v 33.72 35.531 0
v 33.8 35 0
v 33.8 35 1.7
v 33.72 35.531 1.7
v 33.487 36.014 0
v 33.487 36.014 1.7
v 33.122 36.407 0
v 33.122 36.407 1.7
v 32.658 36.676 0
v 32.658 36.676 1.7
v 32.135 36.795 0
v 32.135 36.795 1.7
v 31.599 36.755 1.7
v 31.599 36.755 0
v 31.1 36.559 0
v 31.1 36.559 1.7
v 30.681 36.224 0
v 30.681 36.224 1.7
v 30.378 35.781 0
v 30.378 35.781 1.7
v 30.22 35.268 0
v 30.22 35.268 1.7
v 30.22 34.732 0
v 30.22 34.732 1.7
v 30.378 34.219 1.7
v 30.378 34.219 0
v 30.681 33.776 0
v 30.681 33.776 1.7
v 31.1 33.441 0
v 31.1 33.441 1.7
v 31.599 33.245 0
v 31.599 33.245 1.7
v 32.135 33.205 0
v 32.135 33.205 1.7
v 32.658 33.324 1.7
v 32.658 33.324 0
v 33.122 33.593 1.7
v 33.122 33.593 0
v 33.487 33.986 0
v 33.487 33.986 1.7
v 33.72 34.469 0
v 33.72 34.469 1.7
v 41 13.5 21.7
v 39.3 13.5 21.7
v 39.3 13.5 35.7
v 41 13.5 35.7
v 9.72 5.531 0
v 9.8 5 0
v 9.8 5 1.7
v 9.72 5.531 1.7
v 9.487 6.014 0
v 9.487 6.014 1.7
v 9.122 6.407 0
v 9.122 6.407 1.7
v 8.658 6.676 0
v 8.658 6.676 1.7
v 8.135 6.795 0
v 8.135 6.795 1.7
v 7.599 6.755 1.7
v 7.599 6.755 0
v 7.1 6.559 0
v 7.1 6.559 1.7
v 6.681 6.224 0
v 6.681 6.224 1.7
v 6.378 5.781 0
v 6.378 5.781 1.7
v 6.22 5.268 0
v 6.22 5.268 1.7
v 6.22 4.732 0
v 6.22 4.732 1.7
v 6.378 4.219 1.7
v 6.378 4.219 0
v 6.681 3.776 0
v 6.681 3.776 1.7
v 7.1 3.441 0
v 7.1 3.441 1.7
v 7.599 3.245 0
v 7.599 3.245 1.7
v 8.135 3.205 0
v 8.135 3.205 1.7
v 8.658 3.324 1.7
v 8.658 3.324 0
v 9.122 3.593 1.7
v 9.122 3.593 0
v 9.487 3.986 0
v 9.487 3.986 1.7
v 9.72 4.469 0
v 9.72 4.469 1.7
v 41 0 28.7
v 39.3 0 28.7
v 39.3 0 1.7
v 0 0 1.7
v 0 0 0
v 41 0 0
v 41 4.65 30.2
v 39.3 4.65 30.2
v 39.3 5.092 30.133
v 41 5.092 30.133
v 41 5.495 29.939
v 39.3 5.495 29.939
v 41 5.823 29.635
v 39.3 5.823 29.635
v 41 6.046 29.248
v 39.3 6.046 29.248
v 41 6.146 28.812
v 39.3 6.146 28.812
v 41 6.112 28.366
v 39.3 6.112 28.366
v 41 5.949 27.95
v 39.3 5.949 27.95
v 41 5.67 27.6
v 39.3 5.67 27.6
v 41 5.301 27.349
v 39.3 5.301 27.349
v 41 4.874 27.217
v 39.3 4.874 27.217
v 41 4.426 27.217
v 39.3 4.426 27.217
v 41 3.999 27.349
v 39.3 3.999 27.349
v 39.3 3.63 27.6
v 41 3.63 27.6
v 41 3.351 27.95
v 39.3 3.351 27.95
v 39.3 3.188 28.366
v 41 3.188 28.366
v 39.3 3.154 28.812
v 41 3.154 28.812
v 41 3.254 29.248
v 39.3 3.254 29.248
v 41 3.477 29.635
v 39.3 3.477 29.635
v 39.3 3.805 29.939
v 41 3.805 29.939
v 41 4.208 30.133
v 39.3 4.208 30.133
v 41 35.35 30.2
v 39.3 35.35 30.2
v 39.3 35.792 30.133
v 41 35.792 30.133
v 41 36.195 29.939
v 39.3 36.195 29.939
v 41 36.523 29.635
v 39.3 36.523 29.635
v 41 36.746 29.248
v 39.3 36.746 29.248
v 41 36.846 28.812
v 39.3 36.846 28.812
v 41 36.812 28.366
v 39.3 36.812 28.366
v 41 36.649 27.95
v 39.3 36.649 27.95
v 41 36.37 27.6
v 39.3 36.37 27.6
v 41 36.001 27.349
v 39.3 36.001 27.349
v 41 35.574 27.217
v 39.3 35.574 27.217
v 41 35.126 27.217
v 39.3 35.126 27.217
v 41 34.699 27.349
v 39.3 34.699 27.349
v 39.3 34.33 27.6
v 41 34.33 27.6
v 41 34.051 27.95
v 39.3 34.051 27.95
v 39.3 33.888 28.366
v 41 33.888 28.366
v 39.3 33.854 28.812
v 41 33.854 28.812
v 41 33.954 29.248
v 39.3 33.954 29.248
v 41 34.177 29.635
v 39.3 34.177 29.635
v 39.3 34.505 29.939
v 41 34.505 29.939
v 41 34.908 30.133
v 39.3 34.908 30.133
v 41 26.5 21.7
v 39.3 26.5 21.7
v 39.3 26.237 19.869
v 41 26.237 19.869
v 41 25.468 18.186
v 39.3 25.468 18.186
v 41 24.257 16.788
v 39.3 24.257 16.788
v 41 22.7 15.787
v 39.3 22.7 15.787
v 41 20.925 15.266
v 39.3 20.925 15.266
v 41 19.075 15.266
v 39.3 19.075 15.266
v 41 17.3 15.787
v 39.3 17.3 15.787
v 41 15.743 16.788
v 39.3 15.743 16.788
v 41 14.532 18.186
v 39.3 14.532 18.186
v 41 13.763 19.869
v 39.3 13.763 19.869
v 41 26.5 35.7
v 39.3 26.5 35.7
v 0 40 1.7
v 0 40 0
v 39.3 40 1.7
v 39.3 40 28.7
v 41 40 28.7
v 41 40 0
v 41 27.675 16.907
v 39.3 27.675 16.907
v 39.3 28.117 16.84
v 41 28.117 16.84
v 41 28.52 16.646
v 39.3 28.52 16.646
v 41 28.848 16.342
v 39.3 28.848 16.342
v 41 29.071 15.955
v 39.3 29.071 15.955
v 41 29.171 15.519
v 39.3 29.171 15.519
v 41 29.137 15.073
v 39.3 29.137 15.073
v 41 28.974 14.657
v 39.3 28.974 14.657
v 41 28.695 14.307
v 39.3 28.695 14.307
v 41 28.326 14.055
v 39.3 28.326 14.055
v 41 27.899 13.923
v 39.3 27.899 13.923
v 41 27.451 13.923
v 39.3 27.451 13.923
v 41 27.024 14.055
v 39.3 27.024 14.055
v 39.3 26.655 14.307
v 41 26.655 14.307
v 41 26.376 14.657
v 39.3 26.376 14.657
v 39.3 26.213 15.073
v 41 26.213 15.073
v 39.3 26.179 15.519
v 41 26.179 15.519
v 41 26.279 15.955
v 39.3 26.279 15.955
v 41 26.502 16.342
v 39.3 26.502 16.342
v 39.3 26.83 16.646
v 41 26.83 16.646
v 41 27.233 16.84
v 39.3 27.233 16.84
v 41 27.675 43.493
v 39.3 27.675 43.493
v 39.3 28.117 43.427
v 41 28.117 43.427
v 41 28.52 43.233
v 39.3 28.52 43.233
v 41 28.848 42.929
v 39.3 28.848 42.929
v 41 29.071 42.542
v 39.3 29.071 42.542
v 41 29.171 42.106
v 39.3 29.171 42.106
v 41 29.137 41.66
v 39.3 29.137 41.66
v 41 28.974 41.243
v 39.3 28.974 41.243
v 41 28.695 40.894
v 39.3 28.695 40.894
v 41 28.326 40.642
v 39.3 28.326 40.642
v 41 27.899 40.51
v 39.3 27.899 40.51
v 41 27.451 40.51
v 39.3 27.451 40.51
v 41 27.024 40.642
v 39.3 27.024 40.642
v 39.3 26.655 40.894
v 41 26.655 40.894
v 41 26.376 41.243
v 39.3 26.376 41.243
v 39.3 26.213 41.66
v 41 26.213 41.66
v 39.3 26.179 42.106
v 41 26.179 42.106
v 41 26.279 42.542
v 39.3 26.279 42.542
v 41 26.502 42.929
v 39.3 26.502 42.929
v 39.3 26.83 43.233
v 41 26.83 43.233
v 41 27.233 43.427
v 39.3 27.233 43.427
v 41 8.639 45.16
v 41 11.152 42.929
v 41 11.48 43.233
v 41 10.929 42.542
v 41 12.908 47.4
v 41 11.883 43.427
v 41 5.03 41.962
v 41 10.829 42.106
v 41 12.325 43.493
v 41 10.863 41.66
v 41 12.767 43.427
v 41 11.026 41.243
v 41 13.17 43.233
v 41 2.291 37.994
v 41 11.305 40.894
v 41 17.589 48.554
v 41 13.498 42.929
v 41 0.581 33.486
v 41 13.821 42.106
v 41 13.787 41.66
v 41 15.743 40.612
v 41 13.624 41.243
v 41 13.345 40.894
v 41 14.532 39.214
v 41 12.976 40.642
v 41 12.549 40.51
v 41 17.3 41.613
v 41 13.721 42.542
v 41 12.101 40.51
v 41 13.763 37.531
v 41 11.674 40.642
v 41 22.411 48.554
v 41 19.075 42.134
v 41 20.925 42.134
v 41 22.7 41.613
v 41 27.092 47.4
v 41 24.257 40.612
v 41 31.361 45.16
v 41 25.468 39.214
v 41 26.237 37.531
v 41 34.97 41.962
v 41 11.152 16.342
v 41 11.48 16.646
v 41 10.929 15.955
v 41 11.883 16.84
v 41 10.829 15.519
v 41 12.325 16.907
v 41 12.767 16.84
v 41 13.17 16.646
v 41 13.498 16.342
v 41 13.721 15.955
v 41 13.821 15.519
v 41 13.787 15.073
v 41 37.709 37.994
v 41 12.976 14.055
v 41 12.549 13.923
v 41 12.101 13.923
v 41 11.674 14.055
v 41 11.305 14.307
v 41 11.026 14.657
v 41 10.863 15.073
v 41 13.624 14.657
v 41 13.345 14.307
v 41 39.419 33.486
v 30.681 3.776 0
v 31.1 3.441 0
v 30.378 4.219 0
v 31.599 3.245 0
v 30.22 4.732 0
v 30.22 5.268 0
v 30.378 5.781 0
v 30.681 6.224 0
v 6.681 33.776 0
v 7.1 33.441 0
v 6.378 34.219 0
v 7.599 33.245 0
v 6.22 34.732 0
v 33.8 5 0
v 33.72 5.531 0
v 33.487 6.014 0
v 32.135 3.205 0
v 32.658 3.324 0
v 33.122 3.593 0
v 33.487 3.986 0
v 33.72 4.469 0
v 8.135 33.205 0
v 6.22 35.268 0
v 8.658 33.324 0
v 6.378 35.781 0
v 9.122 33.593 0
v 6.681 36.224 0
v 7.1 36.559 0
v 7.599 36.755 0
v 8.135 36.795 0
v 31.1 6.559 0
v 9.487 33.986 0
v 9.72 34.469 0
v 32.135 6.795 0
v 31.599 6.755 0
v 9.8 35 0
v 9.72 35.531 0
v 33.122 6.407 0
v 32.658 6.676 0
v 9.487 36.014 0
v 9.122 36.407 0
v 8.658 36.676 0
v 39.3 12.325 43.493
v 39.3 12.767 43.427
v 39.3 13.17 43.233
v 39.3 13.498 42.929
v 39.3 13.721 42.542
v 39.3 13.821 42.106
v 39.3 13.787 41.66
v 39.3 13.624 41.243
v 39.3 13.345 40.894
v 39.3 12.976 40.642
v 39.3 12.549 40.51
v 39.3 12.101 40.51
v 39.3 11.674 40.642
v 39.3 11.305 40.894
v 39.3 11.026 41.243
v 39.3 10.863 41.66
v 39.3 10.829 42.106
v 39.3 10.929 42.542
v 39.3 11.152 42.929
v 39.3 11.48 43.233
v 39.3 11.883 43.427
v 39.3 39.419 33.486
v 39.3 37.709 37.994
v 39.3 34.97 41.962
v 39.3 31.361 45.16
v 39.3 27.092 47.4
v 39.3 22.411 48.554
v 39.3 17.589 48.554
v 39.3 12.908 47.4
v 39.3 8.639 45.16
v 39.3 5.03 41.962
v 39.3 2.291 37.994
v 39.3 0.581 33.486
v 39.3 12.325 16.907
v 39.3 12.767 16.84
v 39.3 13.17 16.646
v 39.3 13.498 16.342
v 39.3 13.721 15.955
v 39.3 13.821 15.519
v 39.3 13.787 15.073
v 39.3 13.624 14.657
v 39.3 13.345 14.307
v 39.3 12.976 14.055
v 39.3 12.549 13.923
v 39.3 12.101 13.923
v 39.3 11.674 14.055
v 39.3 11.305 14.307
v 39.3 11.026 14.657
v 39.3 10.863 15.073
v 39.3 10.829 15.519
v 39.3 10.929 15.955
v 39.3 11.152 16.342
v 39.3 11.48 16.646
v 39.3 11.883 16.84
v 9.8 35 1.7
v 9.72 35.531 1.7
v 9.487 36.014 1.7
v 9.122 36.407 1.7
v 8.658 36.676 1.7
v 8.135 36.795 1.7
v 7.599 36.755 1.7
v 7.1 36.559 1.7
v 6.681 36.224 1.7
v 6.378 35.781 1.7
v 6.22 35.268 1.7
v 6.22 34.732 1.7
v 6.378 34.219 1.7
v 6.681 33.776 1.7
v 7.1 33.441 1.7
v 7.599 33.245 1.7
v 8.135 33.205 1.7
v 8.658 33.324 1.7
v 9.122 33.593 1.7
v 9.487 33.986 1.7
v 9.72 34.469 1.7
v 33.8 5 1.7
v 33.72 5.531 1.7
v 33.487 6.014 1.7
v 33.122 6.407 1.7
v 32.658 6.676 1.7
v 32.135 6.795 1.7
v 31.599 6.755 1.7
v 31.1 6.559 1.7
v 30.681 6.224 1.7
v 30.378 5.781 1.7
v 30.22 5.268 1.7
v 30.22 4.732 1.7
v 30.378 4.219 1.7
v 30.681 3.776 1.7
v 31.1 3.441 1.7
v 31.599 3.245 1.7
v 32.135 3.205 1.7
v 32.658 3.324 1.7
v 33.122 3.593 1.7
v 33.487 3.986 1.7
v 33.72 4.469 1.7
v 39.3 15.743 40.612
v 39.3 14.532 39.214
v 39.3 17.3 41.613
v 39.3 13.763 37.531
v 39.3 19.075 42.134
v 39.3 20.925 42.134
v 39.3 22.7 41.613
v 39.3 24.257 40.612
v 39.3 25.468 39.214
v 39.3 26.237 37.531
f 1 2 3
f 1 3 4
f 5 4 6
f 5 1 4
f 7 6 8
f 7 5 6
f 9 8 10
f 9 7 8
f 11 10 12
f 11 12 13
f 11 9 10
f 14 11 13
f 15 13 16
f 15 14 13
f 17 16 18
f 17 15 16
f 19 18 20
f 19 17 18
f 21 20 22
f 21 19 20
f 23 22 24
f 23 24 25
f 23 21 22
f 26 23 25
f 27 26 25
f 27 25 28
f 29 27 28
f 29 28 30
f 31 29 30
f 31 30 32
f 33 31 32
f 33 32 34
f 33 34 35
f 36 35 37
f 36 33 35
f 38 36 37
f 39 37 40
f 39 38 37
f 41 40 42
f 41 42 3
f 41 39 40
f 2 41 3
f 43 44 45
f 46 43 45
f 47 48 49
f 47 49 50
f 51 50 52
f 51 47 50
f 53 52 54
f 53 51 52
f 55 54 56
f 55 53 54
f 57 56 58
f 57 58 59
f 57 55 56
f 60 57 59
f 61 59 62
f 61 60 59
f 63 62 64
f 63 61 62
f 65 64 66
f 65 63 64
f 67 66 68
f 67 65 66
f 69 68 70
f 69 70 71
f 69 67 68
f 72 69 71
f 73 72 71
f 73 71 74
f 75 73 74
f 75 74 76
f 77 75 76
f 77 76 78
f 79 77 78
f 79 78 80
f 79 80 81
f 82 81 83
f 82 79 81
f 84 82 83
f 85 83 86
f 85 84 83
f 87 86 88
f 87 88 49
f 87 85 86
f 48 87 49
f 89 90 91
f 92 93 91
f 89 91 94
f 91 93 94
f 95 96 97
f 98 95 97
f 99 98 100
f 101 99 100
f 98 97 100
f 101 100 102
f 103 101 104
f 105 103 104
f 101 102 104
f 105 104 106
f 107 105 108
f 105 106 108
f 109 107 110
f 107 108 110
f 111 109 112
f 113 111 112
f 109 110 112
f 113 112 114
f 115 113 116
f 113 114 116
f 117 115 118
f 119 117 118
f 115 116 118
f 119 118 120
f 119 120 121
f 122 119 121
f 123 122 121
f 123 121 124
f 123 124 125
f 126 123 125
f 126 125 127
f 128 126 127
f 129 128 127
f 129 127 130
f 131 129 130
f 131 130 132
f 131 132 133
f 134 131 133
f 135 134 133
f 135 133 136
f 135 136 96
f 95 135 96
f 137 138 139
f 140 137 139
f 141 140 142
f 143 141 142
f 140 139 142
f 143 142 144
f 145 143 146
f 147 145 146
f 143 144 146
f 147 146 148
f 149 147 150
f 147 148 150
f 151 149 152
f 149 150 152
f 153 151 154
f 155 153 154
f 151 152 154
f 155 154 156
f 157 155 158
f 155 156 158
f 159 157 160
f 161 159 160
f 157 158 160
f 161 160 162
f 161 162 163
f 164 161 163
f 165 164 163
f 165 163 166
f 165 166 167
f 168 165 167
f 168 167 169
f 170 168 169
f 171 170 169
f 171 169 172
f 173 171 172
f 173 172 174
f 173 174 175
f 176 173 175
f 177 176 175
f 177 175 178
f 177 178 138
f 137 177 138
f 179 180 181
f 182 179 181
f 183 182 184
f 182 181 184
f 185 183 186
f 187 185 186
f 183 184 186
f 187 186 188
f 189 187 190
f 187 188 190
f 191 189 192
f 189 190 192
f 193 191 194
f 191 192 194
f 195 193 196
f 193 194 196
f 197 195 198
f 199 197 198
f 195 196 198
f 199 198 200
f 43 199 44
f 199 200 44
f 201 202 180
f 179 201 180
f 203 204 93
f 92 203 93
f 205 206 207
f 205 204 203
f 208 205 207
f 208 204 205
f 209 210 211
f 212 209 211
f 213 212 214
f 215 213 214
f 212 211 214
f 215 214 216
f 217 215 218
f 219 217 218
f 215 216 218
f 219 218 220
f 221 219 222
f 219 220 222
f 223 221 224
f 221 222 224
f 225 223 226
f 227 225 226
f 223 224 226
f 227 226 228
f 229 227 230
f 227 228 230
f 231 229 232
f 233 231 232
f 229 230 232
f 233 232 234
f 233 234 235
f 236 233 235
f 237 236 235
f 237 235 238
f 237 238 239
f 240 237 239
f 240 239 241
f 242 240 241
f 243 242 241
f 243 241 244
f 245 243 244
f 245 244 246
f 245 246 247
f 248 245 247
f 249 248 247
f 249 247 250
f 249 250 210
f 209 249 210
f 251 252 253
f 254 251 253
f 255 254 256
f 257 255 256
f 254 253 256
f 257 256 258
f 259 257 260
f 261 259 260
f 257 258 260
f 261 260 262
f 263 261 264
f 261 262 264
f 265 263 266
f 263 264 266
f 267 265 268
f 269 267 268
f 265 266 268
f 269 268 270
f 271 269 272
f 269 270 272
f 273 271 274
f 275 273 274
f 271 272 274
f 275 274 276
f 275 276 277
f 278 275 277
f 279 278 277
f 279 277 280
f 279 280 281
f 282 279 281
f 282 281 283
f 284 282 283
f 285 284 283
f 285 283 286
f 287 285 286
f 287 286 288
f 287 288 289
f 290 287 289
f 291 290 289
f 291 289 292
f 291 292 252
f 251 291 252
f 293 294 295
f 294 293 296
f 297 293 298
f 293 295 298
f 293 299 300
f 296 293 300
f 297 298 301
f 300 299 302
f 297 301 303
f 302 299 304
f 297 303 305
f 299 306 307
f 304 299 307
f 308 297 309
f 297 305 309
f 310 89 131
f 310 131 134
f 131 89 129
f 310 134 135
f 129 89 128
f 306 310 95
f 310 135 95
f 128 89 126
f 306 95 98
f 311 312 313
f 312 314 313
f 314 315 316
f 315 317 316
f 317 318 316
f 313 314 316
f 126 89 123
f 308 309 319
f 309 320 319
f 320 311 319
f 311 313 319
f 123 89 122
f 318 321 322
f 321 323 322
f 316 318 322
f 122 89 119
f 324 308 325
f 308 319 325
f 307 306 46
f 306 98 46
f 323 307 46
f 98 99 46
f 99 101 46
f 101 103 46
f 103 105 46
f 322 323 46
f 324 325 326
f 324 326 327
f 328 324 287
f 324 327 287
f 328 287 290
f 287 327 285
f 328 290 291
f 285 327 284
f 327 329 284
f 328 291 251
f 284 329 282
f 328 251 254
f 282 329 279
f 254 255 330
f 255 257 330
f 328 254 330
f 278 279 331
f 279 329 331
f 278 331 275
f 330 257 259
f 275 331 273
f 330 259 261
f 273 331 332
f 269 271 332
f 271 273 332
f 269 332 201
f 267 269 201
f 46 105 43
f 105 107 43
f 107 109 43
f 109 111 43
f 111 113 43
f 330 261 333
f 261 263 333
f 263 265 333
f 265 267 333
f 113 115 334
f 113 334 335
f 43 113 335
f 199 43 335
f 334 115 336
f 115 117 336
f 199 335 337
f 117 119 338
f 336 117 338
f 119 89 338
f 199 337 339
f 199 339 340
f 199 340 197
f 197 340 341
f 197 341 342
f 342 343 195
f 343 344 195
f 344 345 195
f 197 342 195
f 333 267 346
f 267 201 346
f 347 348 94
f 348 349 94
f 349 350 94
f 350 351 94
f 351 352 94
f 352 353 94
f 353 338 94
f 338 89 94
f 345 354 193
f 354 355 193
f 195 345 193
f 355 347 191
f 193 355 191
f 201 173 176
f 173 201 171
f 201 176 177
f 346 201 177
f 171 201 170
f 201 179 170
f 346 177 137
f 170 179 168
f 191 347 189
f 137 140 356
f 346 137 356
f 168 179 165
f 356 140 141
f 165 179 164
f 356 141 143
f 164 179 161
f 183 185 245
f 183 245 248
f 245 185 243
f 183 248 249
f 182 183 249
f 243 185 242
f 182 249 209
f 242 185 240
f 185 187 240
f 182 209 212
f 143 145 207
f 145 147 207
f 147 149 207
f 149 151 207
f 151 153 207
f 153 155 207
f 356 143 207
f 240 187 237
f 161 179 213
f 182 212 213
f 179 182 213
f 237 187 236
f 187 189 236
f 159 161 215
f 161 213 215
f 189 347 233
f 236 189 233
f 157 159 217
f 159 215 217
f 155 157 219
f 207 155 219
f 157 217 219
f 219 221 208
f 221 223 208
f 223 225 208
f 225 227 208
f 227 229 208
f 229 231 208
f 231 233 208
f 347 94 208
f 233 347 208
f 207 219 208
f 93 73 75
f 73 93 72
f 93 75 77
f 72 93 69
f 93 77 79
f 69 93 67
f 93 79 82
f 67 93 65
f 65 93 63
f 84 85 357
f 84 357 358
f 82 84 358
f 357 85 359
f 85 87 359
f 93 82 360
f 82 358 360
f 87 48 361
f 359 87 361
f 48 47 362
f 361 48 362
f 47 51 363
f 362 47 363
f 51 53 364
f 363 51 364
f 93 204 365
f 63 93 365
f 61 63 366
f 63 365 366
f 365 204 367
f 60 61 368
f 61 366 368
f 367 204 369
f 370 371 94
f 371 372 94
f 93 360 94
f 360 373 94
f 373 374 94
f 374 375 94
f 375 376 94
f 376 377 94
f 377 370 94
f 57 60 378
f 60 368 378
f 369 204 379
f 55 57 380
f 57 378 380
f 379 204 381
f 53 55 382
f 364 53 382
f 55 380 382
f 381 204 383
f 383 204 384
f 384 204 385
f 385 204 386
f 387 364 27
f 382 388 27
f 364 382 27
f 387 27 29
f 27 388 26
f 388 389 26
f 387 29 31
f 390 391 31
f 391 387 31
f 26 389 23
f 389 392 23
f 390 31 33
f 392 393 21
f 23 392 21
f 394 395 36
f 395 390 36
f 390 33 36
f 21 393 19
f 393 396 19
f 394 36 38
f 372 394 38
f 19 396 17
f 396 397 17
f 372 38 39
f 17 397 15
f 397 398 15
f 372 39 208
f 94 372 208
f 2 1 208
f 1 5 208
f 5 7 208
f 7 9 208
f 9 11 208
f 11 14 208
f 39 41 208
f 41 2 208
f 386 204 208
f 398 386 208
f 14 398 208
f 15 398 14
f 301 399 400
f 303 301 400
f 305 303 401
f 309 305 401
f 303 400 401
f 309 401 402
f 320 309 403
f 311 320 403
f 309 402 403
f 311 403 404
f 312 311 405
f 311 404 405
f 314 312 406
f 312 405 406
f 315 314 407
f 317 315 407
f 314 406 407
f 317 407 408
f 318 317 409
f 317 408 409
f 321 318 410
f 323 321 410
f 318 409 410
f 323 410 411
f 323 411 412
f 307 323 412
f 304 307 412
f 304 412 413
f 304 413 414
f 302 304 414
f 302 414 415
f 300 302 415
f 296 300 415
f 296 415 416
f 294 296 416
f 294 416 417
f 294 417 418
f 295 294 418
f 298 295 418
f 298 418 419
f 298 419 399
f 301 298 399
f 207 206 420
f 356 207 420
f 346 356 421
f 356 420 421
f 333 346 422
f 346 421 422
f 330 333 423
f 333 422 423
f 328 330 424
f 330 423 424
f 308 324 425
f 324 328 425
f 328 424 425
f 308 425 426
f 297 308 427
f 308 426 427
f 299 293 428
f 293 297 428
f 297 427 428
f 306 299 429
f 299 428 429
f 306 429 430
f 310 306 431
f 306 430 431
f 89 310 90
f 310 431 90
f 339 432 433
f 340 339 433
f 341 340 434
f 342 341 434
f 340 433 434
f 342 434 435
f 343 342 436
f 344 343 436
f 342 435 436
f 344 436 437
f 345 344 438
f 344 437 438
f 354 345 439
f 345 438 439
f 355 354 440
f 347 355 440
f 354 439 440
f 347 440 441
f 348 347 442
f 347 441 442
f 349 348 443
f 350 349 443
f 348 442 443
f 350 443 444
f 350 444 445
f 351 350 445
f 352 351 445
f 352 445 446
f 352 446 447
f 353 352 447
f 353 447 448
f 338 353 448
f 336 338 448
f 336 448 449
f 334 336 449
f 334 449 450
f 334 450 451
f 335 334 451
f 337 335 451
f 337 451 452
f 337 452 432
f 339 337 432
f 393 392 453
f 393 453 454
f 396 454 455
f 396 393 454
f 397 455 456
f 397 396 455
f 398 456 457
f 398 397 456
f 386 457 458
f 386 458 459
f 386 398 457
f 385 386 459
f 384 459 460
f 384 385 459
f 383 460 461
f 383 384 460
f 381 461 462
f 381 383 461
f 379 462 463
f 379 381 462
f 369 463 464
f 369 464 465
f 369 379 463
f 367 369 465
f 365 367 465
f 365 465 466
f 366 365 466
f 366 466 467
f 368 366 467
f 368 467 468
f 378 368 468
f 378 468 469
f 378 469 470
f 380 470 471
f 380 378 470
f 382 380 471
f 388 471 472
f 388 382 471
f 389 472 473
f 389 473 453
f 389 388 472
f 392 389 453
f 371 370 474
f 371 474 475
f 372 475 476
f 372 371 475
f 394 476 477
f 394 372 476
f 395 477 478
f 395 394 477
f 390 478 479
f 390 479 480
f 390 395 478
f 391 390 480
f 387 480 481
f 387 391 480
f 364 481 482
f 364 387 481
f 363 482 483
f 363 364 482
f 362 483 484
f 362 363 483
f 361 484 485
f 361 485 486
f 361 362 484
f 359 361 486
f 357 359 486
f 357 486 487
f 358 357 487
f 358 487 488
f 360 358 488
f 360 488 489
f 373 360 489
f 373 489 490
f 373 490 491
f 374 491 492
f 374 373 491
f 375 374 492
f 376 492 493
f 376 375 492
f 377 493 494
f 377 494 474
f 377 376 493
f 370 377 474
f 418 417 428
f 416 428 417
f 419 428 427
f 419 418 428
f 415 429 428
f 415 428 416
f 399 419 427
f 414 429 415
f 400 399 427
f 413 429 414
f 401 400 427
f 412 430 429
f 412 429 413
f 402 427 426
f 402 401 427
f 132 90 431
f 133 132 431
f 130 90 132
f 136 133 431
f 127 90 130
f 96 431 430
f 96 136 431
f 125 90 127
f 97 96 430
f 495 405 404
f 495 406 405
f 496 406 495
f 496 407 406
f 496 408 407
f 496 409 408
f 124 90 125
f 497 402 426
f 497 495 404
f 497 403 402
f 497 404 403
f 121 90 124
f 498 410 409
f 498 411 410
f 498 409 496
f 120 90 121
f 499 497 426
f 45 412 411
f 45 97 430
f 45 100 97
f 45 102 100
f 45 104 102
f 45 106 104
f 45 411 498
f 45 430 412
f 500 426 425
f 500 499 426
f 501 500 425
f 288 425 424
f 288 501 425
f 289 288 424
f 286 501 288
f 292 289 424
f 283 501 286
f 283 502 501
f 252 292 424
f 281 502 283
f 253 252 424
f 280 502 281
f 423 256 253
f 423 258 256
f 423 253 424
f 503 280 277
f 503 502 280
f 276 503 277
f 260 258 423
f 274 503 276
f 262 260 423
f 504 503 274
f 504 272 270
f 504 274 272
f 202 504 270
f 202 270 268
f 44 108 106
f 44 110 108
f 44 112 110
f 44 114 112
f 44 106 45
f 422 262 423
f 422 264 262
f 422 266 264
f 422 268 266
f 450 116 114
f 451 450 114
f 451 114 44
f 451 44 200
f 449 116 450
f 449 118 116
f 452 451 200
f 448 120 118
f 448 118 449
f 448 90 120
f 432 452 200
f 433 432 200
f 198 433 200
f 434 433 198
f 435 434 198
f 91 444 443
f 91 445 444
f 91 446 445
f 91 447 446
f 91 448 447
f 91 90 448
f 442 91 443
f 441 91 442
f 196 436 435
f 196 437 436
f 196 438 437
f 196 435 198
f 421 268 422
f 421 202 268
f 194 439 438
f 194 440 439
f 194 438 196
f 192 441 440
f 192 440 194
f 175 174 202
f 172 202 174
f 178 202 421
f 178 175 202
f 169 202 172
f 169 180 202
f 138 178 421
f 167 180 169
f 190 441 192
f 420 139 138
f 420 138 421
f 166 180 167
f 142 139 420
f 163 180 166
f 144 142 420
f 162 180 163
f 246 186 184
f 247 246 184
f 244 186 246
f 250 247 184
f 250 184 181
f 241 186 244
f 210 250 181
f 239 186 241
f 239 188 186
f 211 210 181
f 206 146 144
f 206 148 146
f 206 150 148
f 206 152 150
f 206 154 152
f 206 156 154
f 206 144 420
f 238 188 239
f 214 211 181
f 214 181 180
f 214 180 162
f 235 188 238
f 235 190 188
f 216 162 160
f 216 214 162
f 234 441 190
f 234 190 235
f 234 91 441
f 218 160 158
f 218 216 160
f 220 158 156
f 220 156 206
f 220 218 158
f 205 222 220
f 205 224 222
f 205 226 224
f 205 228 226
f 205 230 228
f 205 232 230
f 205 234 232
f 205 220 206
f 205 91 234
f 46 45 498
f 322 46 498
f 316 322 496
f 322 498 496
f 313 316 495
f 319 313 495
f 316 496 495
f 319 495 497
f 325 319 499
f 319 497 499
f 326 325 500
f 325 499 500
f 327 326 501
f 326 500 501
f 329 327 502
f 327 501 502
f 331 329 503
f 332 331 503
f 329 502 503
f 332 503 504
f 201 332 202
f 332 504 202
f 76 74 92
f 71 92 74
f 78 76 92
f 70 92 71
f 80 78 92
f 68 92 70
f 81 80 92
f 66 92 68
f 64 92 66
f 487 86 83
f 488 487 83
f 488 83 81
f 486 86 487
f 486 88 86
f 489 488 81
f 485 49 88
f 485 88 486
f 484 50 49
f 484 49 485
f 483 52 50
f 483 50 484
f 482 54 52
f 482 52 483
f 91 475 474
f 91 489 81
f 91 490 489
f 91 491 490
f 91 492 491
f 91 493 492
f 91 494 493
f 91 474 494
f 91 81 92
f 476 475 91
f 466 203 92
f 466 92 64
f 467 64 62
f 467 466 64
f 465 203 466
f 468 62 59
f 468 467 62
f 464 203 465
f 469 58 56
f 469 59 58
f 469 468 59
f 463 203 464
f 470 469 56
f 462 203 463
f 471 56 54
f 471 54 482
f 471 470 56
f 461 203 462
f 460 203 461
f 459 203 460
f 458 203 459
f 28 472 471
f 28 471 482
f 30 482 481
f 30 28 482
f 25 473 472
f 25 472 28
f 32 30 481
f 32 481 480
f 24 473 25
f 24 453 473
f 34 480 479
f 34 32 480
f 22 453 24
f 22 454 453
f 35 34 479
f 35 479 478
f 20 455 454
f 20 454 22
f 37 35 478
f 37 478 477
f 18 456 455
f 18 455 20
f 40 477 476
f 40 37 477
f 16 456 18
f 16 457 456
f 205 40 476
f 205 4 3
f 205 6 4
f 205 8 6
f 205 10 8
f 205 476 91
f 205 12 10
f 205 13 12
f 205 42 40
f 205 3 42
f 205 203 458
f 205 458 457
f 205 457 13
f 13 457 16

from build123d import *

# Parameters (mm, degrees)
CROQUIS1_R              = 1.8
SALIENTE_EXTRUIR1_DEPTH = 1.7
CROQUIS2_W              = 1.7
CROQUIS2_H              = 40
SALIENTE_EXTRUIR2_DEPTH = 60
CORTAR_EXTRUIR1_DEPTH   = 10
CROQUIS3_4_R            = 1.5
CORTAR_EXTRUIR2_DEPTH   = 10


with BuildPart() as part:
    # Croquis1 → Saliente-Extruir1 (new body)
    with BuildSketch(Plane.XY):
        Polygon((0, 0), (8, 0), (41, 0), (41, 40), (8, 40), (0, 40), align=None)
        with Locations((8, 5)):
            Circle(CROQUIS1_R, mode=Mode.SUBTRACT)
        with Locations((8, 35)):
            Circle(CROQUIS1_R, mode=Mode.SUBTRACT)
        with Locations((32, 5)):
            Circle(CROQUIS1_R, mode=Mode.SUBTRACT)
        with Locations((32, 35)):
            Circle(CROQUIS1_R, mode=Mode.SUBTRACT)
    extrude(amount=SALIENTE_EXTRUIR1_DEPTH)

    # Croquis2 → Saliente-Extruir2 (add)
    with BuildSketch(Plane.XY.offset(1.7)):
        with Locations((40.15, 20)):
            Rectangle(CROQUIS2_W, CROQUIS2_H)
    extrude(amount=SALIENTE_EXTRUIR2_DEPTH)

    # Croquis3 → Cortar-Extruir1 (cut)
    with BuildSketch(Plane.ZY.offset(-39.3)):
        with BuildLine():
            Line((61.7, 40), (28.7, 40))
            ThreePointArc((28.7, 40), (48.7, 20), (28.7, 0))
            Line((28.7, 0), (61.7, 0))
            Line((61.7, 0), (61.7, 40))
        make_face()
        with BuildLine():
            Line((21.7, 13.5), (35.7, 13.5))
            ThreePointArc((35.7, 13.5), (42.2, 20), (35.7, 26.5))
            Line((35.7, 26.5), (21.7, 26.5))
            ThreePointArc((21.7, 26.5), (15.2, 20), (21.7, 13.5))
        make_face()
    extrude(amount=-CORTAR_EXTRUIR1_DEPTH, mode=Mode.SUBTRACT)

    # Croquis3<4> → Cortar-Extruir2 (cut)
    with BuildSketch(Plane.ZY.offset(-39.3)):
        with Locations((15.406510052, 27.675)):
            Circle(CROQUIS3_4_R)
        with Locations((28.7, 35.35)):
            Circle(CROQUIS3_4_R)
        with Locations((41.993489948, 27.675)):
            Circle(CROQUIS3_4_R)
        with Locations((41.993489948, 12.325)):
            Circle(CROQUIS3_4_R)
        with Locations((28.7, 4.65)):
            Circle(CROQUIS3_4_R)
        with Locations((15.406510052, 12.325)):
            Circle(CROQUIS3_4_R)
    extrude(amount=-CORTAR_EXTRUIR2_DEPTH, mode=Mode.SUBTRACT)


solid = part.part
